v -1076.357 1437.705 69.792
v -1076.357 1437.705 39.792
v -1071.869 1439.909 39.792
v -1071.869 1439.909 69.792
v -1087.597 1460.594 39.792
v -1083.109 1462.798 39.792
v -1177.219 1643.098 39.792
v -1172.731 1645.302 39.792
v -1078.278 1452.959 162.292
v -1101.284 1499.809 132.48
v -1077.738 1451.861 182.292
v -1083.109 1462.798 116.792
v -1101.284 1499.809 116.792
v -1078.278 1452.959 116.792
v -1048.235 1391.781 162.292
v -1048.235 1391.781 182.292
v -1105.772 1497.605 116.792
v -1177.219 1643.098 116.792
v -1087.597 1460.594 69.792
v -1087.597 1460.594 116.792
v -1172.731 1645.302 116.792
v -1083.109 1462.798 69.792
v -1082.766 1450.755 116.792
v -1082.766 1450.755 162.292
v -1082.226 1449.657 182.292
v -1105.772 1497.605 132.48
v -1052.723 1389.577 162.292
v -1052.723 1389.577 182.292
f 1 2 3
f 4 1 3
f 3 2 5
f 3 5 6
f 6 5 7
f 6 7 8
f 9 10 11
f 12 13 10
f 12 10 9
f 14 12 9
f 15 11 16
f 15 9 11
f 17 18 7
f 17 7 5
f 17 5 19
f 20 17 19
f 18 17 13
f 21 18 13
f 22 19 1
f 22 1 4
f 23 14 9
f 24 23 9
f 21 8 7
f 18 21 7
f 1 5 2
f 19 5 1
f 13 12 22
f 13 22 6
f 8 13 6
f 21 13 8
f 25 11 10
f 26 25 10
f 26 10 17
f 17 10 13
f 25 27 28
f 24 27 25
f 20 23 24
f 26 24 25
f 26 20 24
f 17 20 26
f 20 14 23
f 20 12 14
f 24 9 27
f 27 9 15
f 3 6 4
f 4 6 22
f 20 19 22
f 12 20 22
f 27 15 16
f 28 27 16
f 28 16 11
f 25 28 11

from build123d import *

# Parameters (mm, degrees)
BOSS_EXTRUDE1_DEPTH = 210.295833075
CUT_EXTRUDE3_DEPTH  = 2024.344561921
BOSS_EXTRUDE2_DEPTH = 77
SKETCH7_W           = 5
SKETCH7_H           = 30
BOSS_EXTRUDE4_DEPTH = 25.5


with BuildPart() as part:
    # Sketch2 → Boss-Extrude1 (new body)
    with BuildSketch(Plane.XY.offset(116.791940296)):
        Polygon((-1177.651750867, 1643.980030656), (-1173.163691186, 1646.183963573), (-1041.945008983, 1378.971984434), (-1046.433068663, 1376.768051516), align=None)
    extrude(amount=BOSS_EXTRUDE1_DEPTH)

    # Sketch5 → Cut-Extrude3 (cut, through all)
    with BuildSketch(Plane(origin=(-293.905010595, -144.326718837, 0), x_dir=(0, 0, 1), z_dir=(-0.8976119360459706, -0.4407865835841701, 0))):
        Polygon((132.47954497, 1831.677464024), (116.791940296, 1831.677464024), (116.791940296, 1994.749190054), (327.087773371, 1994.749190054), (327.087773371, 1623.434080327), (116.791940296, 1623.434080327), (116.791940296, 1779.483651489), (162.291940296, 1779.483651489), (162.291940296, 1711.327604599), (182.291940296, 1711.327604599), (182.291940296, 1778.260209904), align=None)
    extrude(amount=CUT_EXTRUDE3_DEPTH, mode=Mode.SUBTRACT)

    # Sketch6 → Boss-Extrude2 (add)
    with BuildSketch(Plane(origin=(0, 0, 116.791940296), x_dir=(-1, 0, 0), z_dir=(0, 0, -1))):
        Polygon((1087.597149779, 1460.594038789), (1083.109090099, 1462.797971707), (1172.730720222, 1645.302267261), (1177.218779902, 1643.098334343), align=None)
    extrude(amount=BOSS_EXTRUDE2_DEPTH)

    # Sketch7 → Boss-Extrude4 (add)
    with BuildSketch(Plane(origin=(-789.204079504, 1607.124690544, 0), x_dir=(0.8976119360459841, 0.44078658358414263, 0), z_dir=(0.44078658358414263, -0.8976119360459841, 0))):
        with Locations((-329.92992689, 54.791940296)):
            Rectangle(SKETCH7_W, SKETCH7_H)
    extrude(amount=BOSS_EXTRUDE4_DEPTH)


solid = part.part
